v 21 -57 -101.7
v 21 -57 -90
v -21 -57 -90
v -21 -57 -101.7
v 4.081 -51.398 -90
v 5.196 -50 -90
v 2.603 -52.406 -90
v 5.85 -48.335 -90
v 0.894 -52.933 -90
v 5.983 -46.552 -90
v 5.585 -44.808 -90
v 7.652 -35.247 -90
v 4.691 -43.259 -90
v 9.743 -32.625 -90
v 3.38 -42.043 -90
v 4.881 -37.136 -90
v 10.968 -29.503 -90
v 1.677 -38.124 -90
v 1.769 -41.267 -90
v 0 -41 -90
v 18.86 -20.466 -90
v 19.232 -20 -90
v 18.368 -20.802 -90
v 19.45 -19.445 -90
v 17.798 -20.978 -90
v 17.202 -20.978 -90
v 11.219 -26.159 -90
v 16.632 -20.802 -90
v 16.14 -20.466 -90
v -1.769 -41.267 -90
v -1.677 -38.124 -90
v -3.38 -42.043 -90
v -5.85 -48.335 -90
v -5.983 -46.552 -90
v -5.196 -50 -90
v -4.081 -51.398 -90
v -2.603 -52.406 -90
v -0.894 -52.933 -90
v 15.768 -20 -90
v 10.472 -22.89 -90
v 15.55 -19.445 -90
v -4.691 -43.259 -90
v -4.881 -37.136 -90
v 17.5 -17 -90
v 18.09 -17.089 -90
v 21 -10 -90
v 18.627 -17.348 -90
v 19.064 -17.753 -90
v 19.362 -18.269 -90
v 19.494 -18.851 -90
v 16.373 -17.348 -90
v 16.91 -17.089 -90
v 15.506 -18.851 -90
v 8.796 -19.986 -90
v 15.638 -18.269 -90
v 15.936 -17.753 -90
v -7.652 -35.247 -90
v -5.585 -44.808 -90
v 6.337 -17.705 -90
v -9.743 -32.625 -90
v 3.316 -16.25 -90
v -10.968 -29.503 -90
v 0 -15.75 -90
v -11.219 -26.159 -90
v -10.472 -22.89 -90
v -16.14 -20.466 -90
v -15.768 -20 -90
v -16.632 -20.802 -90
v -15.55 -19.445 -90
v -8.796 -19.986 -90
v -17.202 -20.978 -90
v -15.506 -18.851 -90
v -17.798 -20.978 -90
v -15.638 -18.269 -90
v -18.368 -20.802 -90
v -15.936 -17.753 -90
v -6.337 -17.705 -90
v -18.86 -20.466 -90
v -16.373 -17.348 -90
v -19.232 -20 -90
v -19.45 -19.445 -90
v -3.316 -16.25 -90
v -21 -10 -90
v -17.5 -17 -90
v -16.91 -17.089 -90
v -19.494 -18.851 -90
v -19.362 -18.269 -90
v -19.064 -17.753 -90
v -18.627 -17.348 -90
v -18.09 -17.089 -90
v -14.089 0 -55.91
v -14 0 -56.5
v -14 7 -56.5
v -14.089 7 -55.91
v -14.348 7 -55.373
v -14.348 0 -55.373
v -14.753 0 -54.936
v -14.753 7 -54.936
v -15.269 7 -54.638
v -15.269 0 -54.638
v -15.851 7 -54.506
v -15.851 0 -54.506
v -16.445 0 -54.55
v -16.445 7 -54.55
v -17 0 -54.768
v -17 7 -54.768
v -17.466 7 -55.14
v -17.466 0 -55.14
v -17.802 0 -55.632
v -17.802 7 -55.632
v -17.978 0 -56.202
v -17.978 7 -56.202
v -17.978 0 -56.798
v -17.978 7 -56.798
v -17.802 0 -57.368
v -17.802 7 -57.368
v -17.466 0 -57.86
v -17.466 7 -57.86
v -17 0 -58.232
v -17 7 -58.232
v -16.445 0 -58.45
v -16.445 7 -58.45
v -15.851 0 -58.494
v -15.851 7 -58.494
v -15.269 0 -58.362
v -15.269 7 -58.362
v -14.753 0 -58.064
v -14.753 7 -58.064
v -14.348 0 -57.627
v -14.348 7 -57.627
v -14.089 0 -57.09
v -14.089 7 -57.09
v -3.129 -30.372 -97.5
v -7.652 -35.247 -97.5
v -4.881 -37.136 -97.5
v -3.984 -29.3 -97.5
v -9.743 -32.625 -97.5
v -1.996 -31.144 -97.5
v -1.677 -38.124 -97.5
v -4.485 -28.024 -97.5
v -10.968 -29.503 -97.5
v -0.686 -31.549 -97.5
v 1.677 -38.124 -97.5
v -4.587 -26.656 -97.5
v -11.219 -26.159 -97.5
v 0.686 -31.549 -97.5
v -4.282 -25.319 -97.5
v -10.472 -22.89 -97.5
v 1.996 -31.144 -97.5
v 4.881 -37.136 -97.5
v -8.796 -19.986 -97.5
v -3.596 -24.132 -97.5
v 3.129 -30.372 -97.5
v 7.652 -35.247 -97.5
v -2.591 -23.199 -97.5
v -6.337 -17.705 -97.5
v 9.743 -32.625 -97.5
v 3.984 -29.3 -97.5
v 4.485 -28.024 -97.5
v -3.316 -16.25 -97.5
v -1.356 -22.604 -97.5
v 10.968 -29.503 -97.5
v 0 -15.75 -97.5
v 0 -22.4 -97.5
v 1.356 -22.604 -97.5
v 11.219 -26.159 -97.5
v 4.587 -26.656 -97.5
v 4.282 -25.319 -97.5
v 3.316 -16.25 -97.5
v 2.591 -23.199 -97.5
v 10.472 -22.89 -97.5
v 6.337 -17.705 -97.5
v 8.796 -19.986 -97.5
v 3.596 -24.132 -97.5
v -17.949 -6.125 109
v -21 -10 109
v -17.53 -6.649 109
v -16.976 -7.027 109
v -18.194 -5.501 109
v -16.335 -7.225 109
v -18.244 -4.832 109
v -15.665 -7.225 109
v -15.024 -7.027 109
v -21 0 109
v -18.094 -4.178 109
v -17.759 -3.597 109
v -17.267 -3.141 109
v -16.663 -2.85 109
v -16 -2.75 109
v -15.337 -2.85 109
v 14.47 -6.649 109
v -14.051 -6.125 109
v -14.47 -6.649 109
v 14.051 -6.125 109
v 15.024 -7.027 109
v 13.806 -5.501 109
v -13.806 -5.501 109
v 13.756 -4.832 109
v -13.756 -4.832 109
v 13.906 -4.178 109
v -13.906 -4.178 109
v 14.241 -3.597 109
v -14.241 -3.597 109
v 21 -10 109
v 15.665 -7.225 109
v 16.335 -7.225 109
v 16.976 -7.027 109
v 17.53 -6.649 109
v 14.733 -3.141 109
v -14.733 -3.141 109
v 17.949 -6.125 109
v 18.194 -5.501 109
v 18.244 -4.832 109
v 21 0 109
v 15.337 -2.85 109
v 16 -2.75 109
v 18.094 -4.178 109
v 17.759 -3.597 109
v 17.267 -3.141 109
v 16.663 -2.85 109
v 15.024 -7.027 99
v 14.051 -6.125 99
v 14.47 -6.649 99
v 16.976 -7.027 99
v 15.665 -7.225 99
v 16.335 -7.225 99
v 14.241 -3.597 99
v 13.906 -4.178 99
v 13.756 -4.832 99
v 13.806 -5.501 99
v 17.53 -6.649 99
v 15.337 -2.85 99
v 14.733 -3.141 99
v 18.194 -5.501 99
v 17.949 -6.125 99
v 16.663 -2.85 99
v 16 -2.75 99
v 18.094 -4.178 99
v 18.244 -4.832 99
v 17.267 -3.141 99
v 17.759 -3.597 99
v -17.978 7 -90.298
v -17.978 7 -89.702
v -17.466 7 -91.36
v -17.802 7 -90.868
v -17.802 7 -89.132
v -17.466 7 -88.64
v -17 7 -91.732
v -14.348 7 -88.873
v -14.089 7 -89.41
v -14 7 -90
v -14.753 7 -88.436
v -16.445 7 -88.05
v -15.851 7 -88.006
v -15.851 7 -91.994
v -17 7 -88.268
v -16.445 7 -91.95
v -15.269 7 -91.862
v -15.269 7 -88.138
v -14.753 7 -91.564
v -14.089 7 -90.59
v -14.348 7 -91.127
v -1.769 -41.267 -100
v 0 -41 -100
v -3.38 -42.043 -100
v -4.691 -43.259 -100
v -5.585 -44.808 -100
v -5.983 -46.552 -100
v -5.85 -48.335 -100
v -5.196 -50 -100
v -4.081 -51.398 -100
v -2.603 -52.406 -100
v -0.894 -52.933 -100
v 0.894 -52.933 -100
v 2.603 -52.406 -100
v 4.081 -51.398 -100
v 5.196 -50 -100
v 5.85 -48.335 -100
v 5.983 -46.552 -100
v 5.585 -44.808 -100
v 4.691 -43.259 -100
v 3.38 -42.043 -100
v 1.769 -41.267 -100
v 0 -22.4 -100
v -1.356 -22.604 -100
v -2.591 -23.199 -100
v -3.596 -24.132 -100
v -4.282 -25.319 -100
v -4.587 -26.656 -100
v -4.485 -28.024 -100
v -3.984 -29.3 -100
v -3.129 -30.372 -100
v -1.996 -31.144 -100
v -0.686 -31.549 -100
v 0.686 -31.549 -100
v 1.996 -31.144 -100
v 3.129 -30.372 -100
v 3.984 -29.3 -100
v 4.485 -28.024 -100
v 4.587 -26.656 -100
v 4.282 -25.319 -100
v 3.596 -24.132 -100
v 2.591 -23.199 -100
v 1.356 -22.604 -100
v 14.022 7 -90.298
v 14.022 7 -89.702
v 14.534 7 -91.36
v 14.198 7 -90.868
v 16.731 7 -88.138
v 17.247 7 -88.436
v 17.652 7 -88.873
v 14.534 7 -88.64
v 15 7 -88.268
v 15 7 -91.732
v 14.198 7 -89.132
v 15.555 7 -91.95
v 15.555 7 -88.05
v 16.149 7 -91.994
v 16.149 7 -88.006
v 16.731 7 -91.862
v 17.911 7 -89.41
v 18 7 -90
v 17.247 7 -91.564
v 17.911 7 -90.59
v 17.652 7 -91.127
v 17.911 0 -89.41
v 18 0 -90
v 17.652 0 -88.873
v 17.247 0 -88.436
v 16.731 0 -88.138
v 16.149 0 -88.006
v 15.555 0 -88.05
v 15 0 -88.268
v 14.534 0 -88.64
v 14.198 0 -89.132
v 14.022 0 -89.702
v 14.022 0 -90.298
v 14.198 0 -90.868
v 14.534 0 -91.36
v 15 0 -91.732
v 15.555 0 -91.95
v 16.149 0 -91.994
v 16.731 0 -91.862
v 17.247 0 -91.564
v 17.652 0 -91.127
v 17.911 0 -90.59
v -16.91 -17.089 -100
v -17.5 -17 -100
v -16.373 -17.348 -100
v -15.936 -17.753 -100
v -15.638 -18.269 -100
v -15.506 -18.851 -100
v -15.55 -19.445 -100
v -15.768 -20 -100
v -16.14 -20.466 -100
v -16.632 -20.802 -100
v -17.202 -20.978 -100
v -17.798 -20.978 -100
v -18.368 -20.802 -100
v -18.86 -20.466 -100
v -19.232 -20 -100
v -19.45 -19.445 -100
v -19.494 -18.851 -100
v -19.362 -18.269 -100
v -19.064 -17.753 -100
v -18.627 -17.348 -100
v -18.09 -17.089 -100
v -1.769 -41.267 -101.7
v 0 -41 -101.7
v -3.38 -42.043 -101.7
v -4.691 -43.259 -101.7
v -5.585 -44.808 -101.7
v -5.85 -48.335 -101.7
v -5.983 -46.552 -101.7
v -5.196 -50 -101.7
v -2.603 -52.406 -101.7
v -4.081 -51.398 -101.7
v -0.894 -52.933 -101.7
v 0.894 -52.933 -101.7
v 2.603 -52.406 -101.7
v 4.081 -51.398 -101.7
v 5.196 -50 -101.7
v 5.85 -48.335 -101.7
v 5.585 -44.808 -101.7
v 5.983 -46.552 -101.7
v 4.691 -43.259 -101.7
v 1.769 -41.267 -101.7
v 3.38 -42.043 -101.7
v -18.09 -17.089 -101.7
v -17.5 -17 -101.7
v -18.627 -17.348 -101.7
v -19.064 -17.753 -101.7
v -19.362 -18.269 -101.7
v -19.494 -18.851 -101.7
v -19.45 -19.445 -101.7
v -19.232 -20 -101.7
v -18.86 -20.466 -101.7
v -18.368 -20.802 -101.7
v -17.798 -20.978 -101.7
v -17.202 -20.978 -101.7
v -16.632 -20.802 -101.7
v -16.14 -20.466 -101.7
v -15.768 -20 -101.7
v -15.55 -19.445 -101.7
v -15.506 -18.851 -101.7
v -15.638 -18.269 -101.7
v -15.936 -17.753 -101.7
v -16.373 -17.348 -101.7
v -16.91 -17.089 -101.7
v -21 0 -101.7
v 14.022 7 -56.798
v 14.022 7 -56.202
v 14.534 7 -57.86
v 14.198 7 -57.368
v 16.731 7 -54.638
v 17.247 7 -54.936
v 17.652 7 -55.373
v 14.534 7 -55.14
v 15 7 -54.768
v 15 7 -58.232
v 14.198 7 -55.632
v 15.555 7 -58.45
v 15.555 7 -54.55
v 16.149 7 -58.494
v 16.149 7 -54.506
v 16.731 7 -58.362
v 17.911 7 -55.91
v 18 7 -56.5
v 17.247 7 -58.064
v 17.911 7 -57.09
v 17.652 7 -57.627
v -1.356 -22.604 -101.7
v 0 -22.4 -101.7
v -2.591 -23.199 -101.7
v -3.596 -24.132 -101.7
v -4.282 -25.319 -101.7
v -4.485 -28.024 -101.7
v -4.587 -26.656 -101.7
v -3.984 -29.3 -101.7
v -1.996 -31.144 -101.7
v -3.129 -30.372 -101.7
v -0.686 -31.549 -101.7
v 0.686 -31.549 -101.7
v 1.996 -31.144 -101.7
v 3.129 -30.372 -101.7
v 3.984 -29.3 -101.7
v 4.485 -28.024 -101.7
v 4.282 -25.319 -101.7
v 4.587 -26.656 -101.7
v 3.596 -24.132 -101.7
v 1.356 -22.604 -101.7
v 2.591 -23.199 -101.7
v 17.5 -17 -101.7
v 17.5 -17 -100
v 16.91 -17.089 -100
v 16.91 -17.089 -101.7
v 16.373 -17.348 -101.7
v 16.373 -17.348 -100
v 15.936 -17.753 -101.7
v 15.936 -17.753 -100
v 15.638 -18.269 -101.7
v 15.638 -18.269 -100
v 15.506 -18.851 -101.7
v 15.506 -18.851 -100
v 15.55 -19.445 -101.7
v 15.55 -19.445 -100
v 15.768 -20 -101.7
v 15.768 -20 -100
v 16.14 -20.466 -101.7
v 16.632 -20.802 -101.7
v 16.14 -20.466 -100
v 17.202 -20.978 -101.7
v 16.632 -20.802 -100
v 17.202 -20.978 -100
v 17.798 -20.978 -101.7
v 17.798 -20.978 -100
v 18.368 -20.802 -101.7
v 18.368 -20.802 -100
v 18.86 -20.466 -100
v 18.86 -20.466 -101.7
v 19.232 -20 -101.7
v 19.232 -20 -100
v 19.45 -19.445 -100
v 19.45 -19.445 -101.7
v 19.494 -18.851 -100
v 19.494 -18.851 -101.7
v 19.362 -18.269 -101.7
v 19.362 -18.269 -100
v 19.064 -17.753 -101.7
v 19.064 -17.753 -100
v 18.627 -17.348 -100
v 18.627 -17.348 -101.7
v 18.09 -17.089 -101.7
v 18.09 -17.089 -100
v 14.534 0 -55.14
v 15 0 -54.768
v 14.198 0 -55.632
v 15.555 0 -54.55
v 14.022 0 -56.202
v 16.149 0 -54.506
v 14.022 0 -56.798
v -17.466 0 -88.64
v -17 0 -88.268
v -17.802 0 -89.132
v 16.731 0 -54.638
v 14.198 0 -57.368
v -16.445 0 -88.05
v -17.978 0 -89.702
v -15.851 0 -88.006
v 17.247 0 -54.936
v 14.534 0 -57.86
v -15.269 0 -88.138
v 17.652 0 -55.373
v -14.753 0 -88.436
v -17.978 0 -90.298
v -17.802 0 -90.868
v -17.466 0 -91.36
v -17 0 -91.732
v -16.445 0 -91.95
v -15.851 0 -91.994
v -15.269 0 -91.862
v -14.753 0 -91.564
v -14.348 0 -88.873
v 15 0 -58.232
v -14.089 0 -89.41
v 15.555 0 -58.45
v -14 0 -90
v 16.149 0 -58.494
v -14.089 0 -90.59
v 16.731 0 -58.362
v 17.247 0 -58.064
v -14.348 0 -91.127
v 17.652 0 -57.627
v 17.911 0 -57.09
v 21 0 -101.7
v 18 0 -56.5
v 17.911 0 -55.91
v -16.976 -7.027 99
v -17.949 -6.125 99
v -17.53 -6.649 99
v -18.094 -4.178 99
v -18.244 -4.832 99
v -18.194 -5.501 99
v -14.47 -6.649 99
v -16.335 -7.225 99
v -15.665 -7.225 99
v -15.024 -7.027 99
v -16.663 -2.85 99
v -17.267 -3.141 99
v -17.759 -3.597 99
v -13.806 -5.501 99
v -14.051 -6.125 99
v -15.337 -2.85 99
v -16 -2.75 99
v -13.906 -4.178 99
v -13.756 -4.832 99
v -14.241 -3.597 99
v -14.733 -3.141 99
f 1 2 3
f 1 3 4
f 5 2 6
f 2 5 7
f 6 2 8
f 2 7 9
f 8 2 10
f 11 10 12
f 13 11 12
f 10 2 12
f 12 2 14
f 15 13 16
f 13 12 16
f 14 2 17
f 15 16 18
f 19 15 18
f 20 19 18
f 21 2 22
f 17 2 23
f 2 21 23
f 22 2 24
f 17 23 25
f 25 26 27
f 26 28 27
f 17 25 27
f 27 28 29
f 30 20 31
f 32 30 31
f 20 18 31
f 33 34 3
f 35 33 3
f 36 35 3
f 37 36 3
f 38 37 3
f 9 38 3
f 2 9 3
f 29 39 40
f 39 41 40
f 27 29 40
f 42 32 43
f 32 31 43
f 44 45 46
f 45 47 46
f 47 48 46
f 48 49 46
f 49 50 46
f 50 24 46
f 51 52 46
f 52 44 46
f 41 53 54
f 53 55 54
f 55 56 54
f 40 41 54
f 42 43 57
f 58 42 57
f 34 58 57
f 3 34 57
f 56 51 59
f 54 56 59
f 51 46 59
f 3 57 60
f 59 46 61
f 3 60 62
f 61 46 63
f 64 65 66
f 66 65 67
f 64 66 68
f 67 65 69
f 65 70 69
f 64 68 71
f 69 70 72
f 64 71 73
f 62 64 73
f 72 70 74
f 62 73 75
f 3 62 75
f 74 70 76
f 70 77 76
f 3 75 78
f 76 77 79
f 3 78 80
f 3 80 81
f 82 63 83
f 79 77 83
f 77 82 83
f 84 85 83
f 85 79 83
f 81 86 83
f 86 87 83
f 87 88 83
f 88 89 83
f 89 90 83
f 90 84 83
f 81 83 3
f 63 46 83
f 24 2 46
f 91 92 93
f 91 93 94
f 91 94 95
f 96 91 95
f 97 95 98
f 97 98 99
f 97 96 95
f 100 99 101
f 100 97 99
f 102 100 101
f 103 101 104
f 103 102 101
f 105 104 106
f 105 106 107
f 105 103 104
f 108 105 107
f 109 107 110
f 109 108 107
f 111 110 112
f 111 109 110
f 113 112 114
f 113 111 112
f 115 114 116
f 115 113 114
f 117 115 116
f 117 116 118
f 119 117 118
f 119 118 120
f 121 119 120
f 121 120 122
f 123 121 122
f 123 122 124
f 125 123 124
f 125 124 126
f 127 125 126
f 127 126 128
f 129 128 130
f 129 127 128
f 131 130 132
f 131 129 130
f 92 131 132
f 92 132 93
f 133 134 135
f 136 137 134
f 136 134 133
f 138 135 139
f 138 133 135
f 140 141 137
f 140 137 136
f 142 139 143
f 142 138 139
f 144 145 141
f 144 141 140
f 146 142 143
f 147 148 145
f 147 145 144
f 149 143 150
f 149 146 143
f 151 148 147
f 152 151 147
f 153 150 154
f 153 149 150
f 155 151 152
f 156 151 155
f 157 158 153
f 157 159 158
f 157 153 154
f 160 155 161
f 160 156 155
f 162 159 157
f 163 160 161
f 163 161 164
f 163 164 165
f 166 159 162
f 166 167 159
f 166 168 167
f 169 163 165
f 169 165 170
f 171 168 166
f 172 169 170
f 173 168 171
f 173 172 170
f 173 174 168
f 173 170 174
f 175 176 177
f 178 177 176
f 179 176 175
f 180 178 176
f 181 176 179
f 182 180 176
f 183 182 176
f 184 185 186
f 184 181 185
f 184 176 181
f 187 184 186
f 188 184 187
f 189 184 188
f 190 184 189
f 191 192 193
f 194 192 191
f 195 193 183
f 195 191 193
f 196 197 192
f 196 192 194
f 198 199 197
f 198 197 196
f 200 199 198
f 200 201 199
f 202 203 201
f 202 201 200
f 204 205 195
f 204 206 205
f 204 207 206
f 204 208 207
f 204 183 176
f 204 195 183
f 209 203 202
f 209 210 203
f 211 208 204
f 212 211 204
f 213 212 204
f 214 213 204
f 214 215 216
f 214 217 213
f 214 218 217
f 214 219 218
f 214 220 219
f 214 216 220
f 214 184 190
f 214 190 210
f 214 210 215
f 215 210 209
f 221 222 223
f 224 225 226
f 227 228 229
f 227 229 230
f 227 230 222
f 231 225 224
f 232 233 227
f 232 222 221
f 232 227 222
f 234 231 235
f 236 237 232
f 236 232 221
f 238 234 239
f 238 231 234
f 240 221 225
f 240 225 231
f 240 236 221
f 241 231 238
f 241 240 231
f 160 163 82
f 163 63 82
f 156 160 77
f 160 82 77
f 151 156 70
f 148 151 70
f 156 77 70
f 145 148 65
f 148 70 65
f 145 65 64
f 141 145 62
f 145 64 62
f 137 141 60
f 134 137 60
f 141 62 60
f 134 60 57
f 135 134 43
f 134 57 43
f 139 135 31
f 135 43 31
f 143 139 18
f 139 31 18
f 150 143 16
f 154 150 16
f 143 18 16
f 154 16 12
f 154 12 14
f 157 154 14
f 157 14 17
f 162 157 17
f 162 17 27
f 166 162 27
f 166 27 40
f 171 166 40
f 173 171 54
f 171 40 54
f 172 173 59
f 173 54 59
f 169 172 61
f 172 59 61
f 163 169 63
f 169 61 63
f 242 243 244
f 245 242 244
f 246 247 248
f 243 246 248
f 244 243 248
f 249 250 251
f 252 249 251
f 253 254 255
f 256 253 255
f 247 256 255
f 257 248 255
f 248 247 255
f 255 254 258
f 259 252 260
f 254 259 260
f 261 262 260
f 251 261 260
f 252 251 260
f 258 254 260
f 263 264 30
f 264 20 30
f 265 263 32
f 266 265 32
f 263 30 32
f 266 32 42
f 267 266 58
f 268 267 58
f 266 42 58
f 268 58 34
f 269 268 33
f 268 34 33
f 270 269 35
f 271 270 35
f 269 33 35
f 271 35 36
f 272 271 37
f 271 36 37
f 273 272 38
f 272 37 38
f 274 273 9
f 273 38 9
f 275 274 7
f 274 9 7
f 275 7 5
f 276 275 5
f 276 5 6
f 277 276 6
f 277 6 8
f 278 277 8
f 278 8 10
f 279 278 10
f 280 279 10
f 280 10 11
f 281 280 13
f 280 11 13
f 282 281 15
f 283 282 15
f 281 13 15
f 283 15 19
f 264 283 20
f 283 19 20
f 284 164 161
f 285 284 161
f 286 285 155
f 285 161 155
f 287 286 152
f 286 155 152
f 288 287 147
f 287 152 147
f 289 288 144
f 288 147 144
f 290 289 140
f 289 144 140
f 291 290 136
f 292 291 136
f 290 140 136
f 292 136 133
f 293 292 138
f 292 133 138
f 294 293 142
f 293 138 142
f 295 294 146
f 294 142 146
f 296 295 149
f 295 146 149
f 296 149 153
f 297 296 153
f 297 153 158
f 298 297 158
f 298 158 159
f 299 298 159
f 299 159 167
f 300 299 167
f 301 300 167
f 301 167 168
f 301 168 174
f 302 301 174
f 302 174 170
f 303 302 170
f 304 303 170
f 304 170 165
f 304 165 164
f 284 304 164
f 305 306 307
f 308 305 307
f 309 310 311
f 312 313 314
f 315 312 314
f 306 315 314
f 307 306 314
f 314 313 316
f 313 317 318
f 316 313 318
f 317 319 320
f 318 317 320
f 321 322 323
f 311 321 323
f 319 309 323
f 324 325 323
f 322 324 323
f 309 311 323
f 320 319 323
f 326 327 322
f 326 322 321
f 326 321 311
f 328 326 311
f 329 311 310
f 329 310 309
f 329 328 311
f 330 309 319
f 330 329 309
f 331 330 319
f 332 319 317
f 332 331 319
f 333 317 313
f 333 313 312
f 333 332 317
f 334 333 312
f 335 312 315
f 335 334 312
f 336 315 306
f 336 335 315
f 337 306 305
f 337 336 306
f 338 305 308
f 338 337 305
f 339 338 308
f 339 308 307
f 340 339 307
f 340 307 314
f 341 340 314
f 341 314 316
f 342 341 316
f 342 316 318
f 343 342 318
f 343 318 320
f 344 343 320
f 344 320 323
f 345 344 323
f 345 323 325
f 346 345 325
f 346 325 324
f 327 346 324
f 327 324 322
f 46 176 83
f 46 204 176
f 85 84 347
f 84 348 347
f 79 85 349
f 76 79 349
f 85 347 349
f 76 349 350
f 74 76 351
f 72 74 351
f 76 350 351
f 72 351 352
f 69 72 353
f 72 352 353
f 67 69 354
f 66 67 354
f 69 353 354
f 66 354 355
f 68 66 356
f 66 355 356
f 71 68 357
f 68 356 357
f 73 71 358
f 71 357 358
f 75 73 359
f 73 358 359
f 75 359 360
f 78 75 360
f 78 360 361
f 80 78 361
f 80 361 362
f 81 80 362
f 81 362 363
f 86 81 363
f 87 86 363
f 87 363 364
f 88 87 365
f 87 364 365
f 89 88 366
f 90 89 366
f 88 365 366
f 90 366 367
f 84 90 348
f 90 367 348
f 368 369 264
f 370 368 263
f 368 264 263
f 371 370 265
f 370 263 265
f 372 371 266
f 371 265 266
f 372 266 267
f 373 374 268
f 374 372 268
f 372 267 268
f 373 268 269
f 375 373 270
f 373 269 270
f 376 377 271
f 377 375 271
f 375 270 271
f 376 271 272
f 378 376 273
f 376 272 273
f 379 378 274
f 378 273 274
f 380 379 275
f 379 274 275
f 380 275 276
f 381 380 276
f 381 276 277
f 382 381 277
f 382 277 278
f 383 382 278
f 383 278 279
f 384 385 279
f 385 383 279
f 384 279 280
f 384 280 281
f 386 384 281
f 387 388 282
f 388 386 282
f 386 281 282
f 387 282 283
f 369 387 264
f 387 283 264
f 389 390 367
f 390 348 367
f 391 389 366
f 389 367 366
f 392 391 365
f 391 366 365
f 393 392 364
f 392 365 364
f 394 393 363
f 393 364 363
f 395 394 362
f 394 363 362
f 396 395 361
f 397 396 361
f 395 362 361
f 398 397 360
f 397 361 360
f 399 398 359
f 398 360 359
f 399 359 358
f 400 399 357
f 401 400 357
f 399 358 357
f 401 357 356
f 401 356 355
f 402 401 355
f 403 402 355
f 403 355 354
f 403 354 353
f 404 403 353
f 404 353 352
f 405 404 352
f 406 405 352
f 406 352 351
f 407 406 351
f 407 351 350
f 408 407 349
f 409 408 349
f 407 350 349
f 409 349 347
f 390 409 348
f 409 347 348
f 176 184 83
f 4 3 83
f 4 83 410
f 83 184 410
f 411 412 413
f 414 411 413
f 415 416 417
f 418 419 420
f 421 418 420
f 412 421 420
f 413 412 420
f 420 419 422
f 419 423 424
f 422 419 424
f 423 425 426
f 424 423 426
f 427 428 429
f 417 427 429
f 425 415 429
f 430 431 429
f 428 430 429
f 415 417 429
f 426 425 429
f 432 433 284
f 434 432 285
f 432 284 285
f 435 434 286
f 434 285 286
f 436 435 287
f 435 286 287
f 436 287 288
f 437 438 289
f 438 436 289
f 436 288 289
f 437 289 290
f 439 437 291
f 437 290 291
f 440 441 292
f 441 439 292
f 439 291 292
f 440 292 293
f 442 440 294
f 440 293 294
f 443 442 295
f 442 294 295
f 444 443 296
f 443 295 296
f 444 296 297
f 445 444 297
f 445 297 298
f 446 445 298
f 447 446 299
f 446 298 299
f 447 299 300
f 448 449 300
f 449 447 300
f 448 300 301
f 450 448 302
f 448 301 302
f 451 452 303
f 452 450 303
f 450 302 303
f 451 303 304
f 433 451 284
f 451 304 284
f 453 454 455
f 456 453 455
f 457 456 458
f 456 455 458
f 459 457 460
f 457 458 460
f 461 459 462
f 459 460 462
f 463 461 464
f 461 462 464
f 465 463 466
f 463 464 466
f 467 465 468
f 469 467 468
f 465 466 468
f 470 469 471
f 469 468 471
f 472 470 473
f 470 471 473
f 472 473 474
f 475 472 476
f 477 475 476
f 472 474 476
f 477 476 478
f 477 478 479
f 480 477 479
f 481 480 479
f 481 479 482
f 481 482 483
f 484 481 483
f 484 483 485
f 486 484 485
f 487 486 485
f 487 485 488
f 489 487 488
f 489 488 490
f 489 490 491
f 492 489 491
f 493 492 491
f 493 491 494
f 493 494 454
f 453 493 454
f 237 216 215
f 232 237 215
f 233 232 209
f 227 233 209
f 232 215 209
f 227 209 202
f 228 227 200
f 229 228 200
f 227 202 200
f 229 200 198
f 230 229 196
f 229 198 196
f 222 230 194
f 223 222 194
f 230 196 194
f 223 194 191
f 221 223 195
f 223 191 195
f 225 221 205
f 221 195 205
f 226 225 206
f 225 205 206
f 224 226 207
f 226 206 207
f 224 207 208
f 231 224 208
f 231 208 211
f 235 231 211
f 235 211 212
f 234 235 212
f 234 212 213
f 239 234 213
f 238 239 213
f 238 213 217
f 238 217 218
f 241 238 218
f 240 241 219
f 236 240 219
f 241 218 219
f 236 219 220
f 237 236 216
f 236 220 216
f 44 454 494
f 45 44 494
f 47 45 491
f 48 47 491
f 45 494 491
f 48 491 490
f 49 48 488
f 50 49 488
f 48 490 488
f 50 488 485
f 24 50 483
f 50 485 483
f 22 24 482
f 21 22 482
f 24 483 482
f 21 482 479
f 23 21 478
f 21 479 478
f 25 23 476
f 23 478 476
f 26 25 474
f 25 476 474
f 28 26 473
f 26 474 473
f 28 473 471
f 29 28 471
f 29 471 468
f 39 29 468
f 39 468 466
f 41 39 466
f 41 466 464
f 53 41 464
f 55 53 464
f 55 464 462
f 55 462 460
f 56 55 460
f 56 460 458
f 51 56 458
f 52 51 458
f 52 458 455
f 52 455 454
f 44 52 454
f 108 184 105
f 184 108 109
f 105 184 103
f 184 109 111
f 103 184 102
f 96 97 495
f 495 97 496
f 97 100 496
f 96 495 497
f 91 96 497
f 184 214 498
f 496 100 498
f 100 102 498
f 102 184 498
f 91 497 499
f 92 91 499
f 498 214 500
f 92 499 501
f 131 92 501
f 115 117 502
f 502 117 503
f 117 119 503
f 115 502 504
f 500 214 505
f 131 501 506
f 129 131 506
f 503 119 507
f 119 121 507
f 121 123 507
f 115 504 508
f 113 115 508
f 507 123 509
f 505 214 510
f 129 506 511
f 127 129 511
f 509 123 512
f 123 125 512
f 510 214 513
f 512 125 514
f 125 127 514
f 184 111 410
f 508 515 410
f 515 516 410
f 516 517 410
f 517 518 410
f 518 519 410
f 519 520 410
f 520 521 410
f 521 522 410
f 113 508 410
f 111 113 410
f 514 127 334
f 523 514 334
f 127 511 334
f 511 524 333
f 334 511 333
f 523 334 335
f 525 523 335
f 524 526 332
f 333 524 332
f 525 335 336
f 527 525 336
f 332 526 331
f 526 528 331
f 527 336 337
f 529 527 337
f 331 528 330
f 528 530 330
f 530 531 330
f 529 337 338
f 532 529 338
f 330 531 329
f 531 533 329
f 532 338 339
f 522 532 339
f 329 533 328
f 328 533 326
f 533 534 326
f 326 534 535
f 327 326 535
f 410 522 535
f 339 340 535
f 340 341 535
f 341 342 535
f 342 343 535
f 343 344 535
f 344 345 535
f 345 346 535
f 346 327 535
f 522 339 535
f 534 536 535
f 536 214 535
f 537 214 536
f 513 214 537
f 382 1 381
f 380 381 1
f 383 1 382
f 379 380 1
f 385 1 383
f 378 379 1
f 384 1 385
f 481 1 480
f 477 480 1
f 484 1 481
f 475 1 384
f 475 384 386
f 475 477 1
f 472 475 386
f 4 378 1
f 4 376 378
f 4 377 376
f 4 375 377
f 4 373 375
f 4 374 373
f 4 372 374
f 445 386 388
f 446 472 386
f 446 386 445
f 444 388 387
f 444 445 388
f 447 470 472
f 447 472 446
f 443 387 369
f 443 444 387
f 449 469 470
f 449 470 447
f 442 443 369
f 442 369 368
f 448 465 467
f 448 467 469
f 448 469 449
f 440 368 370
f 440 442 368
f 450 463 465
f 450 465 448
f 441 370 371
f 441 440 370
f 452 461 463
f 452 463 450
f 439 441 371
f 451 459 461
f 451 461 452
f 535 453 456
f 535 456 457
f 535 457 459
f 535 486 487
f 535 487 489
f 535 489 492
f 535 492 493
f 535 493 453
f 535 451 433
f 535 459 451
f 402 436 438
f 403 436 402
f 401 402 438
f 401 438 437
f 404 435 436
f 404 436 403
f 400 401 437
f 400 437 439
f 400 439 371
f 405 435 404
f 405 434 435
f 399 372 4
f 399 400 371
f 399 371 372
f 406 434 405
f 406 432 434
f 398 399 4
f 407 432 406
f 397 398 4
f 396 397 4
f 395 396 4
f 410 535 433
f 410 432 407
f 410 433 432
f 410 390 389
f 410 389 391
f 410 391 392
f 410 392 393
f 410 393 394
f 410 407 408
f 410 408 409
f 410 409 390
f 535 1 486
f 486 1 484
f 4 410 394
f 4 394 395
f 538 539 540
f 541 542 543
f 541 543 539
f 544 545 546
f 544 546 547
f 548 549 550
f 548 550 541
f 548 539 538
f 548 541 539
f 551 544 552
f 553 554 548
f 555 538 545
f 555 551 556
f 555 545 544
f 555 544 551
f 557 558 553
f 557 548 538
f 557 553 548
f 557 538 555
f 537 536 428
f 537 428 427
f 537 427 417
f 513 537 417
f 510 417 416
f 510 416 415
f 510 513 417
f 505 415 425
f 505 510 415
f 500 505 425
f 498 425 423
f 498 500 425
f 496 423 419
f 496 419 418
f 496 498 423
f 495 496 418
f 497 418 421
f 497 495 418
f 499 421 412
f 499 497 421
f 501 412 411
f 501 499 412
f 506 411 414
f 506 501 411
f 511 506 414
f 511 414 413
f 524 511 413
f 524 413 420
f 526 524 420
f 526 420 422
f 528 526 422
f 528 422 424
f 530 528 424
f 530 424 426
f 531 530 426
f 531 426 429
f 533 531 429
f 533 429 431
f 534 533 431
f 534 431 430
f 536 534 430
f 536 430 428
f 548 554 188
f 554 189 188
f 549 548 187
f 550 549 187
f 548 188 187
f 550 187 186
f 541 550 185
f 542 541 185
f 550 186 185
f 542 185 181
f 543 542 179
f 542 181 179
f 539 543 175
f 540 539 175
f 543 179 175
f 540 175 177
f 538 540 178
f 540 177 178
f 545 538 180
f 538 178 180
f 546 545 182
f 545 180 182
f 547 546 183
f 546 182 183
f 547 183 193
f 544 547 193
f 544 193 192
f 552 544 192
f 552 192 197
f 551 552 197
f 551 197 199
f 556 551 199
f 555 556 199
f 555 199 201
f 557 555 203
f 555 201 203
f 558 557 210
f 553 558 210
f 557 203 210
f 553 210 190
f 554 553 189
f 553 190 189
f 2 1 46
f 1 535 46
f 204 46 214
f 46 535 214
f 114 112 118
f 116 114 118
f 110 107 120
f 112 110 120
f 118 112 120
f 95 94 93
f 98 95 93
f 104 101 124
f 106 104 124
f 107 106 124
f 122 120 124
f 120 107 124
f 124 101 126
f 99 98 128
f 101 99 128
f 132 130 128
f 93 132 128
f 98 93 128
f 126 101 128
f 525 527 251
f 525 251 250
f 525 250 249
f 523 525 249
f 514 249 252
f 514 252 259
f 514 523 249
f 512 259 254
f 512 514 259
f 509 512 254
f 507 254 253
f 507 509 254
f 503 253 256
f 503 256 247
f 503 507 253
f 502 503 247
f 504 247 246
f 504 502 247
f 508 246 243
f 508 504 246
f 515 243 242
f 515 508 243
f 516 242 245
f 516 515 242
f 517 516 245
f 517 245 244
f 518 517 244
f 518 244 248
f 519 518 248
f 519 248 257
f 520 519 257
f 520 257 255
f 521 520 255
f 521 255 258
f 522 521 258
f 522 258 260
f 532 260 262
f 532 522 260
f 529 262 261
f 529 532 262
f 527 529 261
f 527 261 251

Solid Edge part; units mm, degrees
sketch "Sketch1" plane through (0, 0, 0) normal (0, -1, 0) x (1, 0, 0)
  line L0 (21, -100) -> (21, 100)
  line L1 (21, 100) -> (-21, 100)
  line L2 (-21, 100) -> (-21, -100)
  line L3 (-21, -100) -> (21, -100)
extrude "Protrusion1" add sketch "Sketch1" along normal blind 10
sketch "Sketch2" plane through (0, 0, 0) normal (0, -1, 0) x (1, 0, 0)
  circle A0 centre (16, -56.5) radius 2
  circle A1 centre (-16, -56.5) radius 2
  circle A2 centre (-16, -90) radius 2
  circle A3 centre (16, -90) radius 2
  dimension "D1" = 42
  dimension "D2" = 200
  dimension "D3" = 4
  dimension "D4" = 5
  dimension "D5" = 32
  dimension "D6" = 33.5
  dimension "D7" = 10
extrude "ExtrudedProtrusion_2" add sketch "Sketch2" against normal blind 7
sketch "Sketch3" plane through (0, -10, 0) normal (0, -1, 0) x (0, 0, -1)
  line L0 (90, 21) -> (90, -21)
  line L1 (90, -21) -> (100, -21)
  line L2 (100, -21) -> (100, 21)
  line L3 (100, 21) -> (90, 21)
extrude "ExtrudedProtrusion_3" add sketch "Sketch3" along normal blind 47
sketch "Sketch4" plane through (0, -29.5, -90) normal (0, 0, 1) x (0, 1, 0)
  circle A0 centre (-17.5, 0) radius 6
  circle A1 centre (2.5, 0) radius 4.6
  dimension "D1" = 12
  dimension "D2" = 22.5
  dimension "D3" = 20
  dimension "D4" = 17
  dimension "D5" = 9.2
extrude "Cutout1" cut sketch "Sketch4" against normal up to next
sketch "Sketch5" plane through (0, -29.5, -90) normal (0, 0, 1) x (0, 1, 0)
  circle A0 centre (2.5, 0) radius 4.6
  circle A1 centre (2.5, 0) radius 11.25
  dimension "D1" = 12
  dimension "D2" = 22.5
  dimension "D3" = 20
  dimension "D4" = 17
  dimension "D5" = 9.2
extrude "ExtrudedCutout_2" cut sketch "Sketch5" against normal blind 7.5
sketch "Sketch6" plane through (0, -28.5, -100) normal (0, 0, -1) x (0, 1, 0)
  line L0 (28.5, 21) -> (-28.5, 21)
  line L1 (-28.5, 21) -> (-28.5, -21)
  line L2 (-28.5, -21) -> (28.5, -21)
  line L3 (28.5, -21) -> (28.5, 21)
  circle A0 centre (1.5, 0) radius 4.6
  circle A1 centre (-18.5, 0) radius 6
  dimension "D1" = 4
  dimension "D2" = 8
  dimension "D3" = 35
  dimension "D4" = 3.5
  dimension "D5" = 3.5
extrude "Protrusion2" add sketch "Sketch6" along normal blind 1.7
sketch "Sketch7" plane through (0, -28.5, -100) normal (0, 0, -1) x (0, 1, 0)
  circle A0 centre (9.5, 17.5) radius 2
  circle A1 centre (9.5, -17.5) radius 2
  dimension "D1" = 4
  dimension "D2" = 8
  dimension "D3" = 35
  dimension "D4" = 3.5
  dimension "D5" = 3.5
extrude "Cutout2" cut sketch "Sketch7" along normal up to next
sketch "Sketch8" plane through (0, -28.5, -100) normal (0, 0, -1) x (0, 1, 0)
  circle A0 centre (9.5, 17.5) radius 2
  circle A1 centre (9.5, -17.5) radius 2
  dimension "D1" = 4
  dimension "D2" = 8
  dimension "D3" = 35
  dimension "D4" = 3.5
  dimension "D5" = 3.5
extrude "Cutout3" cut sketch "Sketch8" against normal up to next
sketch "Sketch9" plane through (0, -5, 100) normal (0, 0, 1) x (0, 1, 0)
  line L0 (-5, 21) -> (-5, -21)
  line L1 (-5, -21) -> (5, -21)
  line L2 (5, -21) -> (5, 21)
  line L3 (5, 21) -> (-5, 21)
extrude "ExtrudedProtrusion_6" add sketch "Sketch9" along normal blind 9
sketch "Sketch10" plane through (0, -5, 109) normal (0, 0, 1) x (0, 1, 0)
  circle A0 centre (0, 16) radius 2.25
  circle A1 centre (0, -16) radius 2.25
  dimension "D1" = 4.5
  dimension "D2" = 5
  dimension "D3" = 5
extrude "ExtrudedCutout_5" cut sketch "Sketch10" against normal blind 10
